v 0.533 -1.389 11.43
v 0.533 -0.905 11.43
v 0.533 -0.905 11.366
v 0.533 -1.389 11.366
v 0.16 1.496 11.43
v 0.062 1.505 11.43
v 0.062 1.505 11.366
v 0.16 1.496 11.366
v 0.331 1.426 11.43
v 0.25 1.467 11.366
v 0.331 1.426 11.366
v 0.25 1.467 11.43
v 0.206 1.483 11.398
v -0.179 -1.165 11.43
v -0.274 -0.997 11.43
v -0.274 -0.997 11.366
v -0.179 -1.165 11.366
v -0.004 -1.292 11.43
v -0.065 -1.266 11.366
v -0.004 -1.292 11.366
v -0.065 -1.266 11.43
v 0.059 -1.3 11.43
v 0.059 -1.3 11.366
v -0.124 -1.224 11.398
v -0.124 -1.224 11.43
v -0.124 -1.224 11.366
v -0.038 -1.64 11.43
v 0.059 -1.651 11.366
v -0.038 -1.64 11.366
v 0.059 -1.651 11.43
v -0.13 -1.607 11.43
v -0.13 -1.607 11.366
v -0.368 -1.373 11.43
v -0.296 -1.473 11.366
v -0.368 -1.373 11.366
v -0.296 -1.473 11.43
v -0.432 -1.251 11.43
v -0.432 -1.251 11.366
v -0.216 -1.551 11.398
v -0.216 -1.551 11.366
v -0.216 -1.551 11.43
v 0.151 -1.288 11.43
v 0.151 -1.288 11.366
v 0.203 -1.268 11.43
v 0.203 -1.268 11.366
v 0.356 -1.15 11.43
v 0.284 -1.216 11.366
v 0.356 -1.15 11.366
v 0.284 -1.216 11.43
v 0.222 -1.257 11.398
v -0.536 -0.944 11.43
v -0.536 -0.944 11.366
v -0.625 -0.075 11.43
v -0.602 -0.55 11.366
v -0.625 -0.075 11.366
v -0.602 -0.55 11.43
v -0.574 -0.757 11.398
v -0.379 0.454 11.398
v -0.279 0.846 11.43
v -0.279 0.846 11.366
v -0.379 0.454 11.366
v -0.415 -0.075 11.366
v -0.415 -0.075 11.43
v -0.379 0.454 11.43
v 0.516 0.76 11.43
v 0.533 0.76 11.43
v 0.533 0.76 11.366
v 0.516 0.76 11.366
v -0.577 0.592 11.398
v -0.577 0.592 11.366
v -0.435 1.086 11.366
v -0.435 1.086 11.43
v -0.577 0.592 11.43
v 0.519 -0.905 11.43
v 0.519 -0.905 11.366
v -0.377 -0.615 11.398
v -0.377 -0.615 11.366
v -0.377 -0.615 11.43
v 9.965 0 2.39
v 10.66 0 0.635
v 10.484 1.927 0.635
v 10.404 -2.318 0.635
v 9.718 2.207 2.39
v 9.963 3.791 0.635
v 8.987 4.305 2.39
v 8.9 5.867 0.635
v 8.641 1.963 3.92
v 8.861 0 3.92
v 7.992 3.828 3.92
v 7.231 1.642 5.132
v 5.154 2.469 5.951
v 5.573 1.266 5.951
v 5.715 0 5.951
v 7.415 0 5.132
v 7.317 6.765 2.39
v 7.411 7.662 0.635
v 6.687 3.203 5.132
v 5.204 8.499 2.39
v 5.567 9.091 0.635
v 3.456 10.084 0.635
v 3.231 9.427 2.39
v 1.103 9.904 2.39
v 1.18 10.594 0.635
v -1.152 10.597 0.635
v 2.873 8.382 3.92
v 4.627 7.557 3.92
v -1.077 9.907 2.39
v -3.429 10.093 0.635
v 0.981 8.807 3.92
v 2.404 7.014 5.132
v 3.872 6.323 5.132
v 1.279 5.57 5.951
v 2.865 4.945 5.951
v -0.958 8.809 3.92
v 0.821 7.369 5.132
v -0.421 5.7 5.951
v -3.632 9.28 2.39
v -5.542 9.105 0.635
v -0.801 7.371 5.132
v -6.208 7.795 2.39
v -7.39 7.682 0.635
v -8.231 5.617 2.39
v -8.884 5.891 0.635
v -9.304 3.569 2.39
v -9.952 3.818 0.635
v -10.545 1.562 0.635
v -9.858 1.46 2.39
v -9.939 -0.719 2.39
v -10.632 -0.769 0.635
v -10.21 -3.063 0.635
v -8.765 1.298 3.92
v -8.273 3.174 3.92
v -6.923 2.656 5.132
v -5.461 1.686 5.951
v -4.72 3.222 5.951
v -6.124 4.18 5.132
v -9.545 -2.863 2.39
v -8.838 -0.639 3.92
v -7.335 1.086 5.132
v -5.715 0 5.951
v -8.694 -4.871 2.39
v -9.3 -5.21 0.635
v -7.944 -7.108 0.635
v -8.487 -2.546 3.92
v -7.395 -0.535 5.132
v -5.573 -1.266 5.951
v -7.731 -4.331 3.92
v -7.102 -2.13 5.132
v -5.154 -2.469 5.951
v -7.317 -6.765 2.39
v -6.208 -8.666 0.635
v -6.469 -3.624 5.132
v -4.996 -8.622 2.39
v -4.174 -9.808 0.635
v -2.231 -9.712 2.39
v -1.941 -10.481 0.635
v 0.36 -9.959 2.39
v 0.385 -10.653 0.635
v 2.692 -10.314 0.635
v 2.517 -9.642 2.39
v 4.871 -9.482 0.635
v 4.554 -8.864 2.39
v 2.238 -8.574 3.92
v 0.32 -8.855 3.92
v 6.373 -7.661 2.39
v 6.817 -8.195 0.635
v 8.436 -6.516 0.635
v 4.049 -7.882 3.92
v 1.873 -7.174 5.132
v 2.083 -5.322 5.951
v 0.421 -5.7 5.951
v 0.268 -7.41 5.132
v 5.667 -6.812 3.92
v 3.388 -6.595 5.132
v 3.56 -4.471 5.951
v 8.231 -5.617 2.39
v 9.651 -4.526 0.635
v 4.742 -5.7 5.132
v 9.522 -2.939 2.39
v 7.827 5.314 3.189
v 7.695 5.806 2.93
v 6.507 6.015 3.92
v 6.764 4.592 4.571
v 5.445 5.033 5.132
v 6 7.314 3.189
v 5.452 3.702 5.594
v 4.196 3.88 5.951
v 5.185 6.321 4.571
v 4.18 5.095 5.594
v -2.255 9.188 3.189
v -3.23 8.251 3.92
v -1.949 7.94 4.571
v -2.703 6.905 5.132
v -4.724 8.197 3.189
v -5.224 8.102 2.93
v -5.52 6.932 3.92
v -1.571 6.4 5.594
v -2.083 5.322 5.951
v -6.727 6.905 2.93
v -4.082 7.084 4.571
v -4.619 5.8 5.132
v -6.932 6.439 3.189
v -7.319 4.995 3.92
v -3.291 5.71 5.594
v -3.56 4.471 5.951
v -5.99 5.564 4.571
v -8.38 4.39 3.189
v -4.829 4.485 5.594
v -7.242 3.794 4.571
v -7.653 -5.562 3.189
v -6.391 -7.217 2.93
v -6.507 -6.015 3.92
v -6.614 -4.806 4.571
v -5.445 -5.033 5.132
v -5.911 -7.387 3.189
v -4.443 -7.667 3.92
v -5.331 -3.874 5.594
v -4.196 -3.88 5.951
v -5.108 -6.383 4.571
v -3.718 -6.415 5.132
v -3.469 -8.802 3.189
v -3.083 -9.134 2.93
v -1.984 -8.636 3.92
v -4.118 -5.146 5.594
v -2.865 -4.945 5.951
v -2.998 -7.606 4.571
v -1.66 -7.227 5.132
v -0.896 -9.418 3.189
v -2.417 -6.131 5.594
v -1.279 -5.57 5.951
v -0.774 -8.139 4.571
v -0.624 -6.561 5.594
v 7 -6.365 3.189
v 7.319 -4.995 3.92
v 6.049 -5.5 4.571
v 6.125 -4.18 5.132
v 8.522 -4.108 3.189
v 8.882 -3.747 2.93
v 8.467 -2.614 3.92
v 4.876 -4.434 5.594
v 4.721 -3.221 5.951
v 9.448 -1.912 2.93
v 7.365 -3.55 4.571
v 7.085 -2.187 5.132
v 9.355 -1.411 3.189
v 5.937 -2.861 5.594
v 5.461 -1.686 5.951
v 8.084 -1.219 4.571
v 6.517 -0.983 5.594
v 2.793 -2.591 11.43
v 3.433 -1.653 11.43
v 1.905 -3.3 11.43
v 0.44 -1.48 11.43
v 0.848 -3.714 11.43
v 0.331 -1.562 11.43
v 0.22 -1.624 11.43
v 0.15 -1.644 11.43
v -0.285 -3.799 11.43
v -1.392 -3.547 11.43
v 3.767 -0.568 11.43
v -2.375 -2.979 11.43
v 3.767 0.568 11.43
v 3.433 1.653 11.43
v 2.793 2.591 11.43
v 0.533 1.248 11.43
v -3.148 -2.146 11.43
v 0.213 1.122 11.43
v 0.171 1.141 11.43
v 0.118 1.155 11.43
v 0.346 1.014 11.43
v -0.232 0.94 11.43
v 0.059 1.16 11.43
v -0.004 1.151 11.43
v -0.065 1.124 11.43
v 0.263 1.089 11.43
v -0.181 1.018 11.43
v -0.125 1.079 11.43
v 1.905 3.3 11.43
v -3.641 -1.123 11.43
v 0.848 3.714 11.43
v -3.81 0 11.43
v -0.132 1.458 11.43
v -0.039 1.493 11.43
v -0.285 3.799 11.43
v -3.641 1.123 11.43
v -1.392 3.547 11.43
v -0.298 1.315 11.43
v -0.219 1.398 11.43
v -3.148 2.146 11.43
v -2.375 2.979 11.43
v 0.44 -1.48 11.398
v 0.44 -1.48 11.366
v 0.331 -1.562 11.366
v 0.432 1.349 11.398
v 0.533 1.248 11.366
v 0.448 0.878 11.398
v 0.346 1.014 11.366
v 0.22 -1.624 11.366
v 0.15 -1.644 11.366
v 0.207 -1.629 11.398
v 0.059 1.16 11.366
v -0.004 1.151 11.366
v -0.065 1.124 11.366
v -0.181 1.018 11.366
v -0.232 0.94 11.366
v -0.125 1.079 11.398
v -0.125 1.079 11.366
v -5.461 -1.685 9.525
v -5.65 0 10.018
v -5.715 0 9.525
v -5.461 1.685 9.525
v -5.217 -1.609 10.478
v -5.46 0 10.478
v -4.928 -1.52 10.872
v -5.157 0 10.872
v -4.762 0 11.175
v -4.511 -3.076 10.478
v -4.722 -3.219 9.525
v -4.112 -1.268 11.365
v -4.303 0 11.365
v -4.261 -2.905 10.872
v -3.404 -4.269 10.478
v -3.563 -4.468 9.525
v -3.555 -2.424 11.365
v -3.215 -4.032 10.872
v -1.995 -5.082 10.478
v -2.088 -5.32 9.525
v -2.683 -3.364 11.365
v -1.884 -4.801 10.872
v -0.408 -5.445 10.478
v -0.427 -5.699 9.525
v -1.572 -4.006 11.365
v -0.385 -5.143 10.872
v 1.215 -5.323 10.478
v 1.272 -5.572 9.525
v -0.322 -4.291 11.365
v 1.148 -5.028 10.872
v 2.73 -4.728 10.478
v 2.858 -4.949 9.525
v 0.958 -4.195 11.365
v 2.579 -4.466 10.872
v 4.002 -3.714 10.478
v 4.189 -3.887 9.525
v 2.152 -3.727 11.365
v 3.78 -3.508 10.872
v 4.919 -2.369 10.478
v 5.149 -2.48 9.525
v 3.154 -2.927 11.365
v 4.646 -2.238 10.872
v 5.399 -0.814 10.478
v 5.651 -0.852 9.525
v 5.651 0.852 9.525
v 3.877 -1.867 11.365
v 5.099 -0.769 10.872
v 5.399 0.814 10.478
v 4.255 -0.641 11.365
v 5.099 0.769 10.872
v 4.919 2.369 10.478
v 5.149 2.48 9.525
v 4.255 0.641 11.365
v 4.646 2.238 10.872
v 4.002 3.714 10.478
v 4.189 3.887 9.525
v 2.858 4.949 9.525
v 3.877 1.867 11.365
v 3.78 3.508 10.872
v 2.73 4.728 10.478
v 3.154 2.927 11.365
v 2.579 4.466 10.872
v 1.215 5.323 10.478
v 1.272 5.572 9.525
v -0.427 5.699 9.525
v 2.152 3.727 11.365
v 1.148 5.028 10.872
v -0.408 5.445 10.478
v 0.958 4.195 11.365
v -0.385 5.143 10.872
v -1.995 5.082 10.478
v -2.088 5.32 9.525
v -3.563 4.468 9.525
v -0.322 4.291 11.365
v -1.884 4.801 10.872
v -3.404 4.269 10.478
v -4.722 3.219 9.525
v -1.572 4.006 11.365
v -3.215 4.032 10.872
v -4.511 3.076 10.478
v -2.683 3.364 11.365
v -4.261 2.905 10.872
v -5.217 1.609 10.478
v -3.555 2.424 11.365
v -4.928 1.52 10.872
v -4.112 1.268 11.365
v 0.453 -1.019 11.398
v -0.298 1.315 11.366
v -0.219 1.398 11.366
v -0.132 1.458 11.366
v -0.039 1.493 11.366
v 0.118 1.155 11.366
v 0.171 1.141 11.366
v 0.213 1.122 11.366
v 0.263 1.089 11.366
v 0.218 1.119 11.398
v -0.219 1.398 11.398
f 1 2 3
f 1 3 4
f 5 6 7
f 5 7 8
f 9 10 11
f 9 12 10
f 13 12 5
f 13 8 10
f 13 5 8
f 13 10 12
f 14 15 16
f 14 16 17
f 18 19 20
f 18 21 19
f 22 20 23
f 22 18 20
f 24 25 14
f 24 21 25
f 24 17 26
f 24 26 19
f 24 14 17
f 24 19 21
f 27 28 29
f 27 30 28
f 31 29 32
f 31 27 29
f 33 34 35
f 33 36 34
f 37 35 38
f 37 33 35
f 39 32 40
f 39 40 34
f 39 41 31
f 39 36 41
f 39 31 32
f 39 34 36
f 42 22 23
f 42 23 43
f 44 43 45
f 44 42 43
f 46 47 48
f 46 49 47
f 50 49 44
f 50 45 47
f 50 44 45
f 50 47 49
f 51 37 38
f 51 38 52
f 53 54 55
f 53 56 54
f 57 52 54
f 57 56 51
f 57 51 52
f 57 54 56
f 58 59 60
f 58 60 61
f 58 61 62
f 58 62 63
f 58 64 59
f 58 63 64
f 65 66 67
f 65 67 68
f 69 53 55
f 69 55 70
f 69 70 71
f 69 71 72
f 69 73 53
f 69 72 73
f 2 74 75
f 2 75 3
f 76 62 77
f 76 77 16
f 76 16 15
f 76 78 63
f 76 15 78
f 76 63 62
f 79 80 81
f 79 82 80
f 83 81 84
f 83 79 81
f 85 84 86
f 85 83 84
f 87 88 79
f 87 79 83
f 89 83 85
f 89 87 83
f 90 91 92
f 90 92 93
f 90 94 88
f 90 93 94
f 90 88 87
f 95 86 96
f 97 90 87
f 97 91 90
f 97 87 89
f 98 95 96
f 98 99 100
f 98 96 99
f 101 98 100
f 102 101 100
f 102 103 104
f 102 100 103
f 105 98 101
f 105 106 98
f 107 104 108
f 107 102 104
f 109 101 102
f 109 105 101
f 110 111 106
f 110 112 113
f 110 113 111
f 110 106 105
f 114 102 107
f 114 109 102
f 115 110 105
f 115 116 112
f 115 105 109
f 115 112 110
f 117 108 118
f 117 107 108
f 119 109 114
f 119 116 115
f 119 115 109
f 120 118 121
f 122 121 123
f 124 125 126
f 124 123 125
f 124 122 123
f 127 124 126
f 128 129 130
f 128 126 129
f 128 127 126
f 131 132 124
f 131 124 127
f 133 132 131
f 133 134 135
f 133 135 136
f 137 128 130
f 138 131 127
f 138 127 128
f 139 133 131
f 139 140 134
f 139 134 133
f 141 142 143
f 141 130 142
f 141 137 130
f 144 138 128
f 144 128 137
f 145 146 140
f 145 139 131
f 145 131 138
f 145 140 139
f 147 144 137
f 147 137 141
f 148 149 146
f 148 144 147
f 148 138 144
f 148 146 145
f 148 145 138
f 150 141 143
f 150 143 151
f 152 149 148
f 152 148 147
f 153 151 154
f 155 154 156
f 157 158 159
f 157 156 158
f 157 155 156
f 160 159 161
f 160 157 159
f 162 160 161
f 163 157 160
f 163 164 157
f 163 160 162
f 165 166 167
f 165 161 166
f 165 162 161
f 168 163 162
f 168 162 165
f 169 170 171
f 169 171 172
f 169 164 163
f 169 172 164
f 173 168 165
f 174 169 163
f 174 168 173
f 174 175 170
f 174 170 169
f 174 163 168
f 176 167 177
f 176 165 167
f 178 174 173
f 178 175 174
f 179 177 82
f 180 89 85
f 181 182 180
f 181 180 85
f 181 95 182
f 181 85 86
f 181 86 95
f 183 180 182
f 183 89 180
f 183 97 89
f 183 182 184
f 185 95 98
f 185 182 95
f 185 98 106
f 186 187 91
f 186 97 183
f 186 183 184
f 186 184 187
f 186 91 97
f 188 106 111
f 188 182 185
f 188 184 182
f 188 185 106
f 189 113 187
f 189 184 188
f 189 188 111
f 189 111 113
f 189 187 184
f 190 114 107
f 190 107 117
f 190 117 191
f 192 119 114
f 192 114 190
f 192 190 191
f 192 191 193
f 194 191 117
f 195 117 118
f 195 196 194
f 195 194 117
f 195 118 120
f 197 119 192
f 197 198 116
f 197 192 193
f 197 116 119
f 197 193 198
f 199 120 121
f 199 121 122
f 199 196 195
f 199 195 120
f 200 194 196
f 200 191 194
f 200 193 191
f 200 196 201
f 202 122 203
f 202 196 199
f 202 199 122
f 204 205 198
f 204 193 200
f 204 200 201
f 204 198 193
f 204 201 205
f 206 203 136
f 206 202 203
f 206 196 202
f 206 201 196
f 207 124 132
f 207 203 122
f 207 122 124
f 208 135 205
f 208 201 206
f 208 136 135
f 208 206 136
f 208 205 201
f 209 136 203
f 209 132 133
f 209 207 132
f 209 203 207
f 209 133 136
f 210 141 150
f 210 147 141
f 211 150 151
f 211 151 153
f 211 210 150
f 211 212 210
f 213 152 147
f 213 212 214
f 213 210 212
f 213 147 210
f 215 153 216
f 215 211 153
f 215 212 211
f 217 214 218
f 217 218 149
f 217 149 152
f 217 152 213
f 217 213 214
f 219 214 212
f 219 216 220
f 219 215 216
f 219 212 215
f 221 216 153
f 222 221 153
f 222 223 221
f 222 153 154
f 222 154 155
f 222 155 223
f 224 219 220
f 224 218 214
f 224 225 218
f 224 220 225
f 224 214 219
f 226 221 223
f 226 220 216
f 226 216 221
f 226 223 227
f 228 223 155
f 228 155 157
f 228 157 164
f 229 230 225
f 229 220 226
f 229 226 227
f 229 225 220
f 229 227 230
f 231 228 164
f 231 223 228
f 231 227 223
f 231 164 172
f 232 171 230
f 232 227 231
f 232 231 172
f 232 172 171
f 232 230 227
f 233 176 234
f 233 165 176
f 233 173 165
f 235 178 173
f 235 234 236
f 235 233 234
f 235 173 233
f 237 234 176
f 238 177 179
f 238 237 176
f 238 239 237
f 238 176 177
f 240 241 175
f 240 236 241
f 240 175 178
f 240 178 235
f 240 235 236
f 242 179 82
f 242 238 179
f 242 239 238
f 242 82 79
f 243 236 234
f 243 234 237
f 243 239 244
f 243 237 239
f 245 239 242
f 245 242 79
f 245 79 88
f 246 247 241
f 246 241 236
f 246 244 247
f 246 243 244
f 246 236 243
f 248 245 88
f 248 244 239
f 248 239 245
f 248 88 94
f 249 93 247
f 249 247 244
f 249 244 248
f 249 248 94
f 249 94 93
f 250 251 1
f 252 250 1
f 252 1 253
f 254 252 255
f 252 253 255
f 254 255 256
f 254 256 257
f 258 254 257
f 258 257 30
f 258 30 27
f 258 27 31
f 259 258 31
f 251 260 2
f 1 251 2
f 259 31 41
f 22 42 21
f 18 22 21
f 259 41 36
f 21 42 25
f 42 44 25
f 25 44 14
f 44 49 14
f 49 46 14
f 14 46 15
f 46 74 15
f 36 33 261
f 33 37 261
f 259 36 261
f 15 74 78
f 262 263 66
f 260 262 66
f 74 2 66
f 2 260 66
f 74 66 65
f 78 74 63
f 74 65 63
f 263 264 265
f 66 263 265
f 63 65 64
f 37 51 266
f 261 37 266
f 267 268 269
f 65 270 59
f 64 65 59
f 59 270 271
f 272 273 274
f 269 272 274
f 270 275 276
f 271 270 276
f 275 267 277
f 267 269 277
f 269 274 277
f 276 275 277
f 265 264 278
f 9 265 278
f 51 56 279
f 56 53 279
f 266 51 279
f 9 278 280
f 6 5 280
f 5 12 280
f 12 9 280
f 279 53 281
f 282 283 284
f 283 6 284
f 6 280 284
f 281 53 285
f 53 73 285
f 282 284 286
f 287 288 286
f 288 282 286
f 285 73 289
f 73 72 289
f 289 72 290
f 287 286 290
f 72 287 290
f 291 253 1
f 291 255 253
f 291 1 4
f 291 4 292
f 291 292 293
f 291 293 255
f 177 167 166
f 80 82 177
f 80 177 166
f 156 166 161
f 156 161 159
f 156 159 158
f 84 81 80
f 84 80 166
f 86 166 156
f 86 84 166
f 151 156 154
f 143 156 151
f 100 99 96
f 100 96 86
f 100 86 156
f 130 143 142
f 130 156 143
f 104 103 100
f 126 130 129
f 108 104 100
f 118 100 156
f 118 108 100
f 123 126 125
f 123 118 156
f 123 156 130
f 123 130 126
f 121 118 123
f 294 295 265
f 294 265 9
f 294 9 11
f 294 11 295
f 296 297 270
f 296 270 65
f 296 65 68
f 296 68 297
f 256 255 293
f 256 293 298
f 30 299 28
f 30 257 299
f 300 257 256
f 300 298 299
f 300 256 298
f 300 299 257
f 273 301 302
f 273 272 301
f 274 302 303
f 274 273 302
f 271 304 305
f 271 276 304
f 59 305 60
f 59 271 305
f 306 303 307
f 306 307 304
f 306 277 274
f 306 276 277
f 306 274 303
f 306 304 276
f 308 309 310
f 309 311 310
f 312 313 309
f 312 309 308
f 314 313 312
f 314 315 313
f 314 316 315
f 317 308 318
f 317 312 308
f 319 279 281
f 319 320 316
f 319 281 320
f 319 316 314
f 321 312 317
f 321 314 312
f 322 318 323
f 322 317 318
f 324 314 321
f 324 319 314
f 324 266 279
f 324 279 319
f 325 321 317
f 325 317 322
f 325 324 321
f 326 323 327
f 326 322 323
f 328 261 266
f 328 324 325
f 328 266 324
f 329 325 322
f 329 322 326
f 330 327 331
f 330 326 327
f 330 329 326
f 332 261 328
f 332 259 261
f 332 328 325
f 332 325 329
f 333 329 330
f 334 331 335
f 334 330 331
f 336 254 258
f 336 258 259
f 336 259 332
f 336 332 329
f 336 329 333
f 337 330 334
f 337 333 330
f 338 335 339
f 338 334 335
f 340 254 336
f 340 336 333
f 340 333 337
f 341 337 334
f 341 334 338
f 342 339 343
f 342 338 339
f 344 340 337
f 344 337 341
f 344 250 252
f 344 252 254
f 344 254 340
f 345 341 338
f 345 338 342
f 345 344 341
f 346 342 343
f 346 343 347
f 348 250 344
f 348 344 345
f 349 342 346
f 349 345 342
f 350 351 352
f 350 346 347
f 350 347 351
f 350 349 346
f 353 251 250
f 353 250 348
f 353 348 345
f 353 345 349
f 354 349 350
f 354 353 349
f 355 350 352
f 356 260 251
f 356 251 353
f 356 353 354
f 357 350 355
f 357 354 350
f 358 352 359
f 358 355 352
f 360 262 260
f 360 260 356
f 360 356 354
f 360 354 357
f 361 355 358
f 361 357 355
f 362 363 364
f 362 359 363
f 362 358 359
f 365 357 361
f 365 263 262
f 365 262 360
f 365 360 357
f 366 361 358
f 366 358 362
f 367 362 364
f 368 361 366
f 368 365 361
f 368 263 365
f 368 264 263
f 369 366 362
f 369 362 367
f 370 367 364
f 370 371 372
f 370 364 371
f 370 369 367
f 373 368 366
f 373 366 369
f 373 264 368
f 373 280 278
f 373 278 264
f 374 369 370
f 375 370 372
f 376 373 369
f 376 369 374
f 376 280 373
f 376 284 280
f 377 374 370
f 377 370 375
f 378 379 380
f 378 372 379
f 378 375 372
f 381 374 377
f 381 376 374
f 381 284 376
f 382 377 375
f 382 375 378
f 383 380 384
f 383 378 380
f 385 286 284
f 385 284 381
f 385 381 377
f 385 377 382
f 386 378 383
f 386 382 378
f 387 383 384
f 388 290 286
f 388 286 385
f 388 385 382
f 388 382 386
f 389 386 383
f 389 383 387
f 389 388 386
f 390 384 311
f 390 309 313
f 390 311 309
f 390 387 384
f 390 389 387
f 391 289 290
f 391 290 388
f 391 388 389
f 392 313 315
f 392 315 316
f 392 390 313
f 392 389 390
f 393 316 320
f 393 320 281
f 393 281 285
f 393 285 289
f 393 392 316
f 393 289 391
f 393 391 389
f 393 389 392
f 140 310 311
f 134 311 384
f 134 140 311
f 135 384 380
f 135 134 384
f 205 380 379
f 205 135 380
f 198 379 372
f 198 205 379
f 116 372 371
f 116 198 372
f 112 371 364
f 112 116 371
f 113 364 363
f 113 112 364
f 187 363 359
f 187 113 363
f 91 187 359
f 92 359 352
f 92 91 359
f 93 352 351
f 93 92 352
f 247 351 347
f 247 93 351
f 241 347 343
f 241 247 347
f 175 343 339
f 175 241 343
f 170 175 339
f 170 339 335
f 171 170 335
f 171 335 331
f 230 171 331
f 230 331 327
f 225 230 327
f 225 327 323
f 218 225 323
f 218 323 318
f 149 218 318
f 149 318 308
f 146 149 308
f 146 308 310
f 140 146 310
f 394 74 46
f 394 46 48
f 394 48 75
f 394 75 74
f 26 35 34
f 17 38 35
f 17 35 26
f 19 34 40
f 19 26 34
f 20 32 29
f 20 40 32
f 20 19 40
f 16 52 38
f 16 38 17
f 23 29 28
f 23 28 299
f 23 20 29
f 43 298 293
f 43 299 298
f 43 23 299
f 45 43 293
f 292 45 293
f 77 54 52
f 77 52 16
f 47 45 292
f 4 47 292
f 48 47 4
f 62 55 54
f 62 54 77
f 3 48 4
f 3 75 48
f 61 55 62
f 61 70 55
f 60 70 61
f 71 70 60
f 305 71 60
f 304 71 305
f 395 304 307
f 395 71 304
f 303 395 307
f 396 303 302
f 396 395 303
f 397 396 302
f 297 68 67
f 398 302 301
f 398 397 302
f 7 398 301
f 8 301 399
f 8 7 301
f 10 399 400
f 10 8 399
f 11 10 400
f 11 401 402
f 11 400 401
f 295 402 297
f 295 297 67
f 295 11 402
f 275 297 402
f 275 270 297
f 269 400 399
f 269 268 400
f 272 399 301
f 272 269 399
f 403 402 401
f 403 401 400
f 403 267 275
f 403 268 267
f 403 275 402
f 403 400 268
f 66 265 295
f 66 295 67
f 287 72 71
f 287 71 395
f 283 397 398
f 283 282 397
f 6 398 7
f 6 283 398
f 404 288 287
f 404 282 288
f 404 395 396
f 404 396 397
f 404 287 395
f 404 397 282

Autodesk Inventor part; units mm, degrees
ref_plane "YZ Plane" through (0, 0, 0) normal (1, 0, 0) x (0, 1, 0)
ref_plane "XZ Plane" through (0, 0, 0) normal (0, 1, 0) x (-1, 0, 0)
ref_plane "XY Plane" through (0, 0, 0) normal (0, 0, 1) x (1, 0, 0)
sketch "Sketch1" plane through (0, 0, 0) normal (0, 0, 1) x (1, 0, 0)
  circle A0 centre (0, 0) radius 10.795
  dimension "d0" = 21.59
extrude "Extrusion1" add sketch "Sketch1" along normal blind 6.35
fillet "Fillet1" radius 7.62 1 edges at (-10.795, 0, 6.35)
sketch "Sketch2" plane through (0, 0, 0) normal (0, 0, -1) x (-1, 0, 0)
  circle A0 centre (0, 0) radius 10.795 projected
  circle A1 centre (0, 0) radius 5.715
  dimension "d4" = 11.43
extrude "Extrusion2" add sketch "Sketch2" against normal blind 11.43 contours A1
fillet "Fillet2" radius 1.905 1 edges at (5.715, 0, 11.43)
sketch "Sketch3" plane through (0, 0, 11.43) normal (0, 0, 1) x (1, 0, 0)
  line L0 (-0.6917, 1.5054) -> (0.568, 1.5054) construction
  line L1 (0.568, 1.5054) -> (0.568, -1.6512) construction
  line L2 (0.568, -1.6512) -> (-0.6917, -1.6512) construction
  line L3 (-0.6917, -1.6512) -> (-0.6917, 1.5054) construction
  spline S0 degree 2 poles (0.0592, -1.6512) (-0.0915, -1.6512) (-0.3409, -1.4512) (-0.4323, -1.2511) knots 0 0 0 1 2 2 2
  spline S1 degree 2 poles (-0.4323, -1.2511) (-0.5237, -1.0535) (-0.625, -0.4607) (-0.625, -0.0754) knots 0 0 0 1 2 2 2
  spline S2 degree 2 poles (-0.625, -0.0754) (-0.625, 0.3075) (-0.5287, 0.8756) (-0.4348, 1.0855) knots 0 0 0 1 2 2 2
  spline S3 degree 2 poles (-0.4348, 1.0855) (-0.3434, 1.2905) (-0.0939, 1.5054) (0.0617, 1.5054) knots 0 0 0 1 2 2 2
  spline S4 degree 2 poles (0.0617, 1.5054) (0.1382, 1.5054) (0.2741, 1.461) (0.3309, 1.4264) knots 0 0 0 1 2 2 2
  spline S5 degree 2 poles (0.3309, 1.4264) (0.3803, 1.3943) (0.484, 1.3029) (0.5334, 1.2485) knots 0 0 0 1 2 2 2
  line L4 (0.5334, 1.2485) -> (0.5334, 0.7595)
  line L5 (0.5334, 0.7595) -> (0.5162, 0.7595)
  spline S6 degree 2 poles (0.5162, 0.7595) (0.4915, 0.8089) (0.405, 0.9472) (0.3457, 1.0139) knots 0 0 0 1 2 2 2
  spline S7 degree 2 poles (0.3457, 1.0139) (0.2864, 1.0781) (0.1506, 1.1596) (0.0592, 1.1596) knots 0 0 0 1 2 2 2
  spline S8 degree 2 poles (0.0592, 1.1596) (-0.0371, 1.1596) (-0.2125, 0.9991) (-0.2792, 0.8459) knots 0 0 0 1 2 2 2
  spline S9 degree 2 poles (-0.2792, 0.8459) (-0.3434, 0.6903) (-0.415, 0.2186) (-0.415, -0.0754) knots 0 0 0 1 2 2 2
  spline S10 degree 2 poles (-0.415, -0.0754) (-0.415, -0.3891) (-0.3385, -0.8411) (-0.2743, -0.9967) knots 0 0 0 1 2 2 2
  spline S11 degree 2 poles (-0.2743, -0.9967) (-0.21, -1.1474) (-0.0371, -1.3005) (0.0592, -1.3005) knots 0 0 0 1 2 2 2
  spline S12 degree 2 poles (0.0592, -1.3005) (0.1481, -1.3005) (0.2963, -1.2141) (0.3556, -1.1498) knots 0 0 0 1 2 2 2
  spline S13 degree 2 poles (0.3556, -1.1498) (0.4124, -1.0856) (0.4939, -0.9522) (0.5186, -0.9053) knots 0 0 0 1 2 2 2
  line L6 (0.5186, -0.9053) -> (0.5334, -0.9053)
  line L7 (0.5334, -0.9053) -> (0.5334, -1.3894)
  spline S14 degree 2 poles (0.5334, -1.3894) (0.484, -1.4364) (0.3951, -1.5228) (0.3309, -1.5623) knots 0 0 0 1 2 2 2
  spline S15 degree 2 poles (0.3309, -1.5623) (0.2642, -1.6068) (0.1506, -1.6512) (0.0592, -1.6512) knots 0 0 0 1 2 2 2
extrude "Extrusion3" cut sketch "Sketch3" against normal blind 0.0635
sketch "Sketch4" plane through (0, 0, 0) normal (0, 0, -1) x (-1, 0, 0)
  circle A0 centre (0, 0) radius 10.795 projected
extrude "Extrusion4" cut sketch "Sketch4" against normal blind 0.635
properties part number "C Stick"
